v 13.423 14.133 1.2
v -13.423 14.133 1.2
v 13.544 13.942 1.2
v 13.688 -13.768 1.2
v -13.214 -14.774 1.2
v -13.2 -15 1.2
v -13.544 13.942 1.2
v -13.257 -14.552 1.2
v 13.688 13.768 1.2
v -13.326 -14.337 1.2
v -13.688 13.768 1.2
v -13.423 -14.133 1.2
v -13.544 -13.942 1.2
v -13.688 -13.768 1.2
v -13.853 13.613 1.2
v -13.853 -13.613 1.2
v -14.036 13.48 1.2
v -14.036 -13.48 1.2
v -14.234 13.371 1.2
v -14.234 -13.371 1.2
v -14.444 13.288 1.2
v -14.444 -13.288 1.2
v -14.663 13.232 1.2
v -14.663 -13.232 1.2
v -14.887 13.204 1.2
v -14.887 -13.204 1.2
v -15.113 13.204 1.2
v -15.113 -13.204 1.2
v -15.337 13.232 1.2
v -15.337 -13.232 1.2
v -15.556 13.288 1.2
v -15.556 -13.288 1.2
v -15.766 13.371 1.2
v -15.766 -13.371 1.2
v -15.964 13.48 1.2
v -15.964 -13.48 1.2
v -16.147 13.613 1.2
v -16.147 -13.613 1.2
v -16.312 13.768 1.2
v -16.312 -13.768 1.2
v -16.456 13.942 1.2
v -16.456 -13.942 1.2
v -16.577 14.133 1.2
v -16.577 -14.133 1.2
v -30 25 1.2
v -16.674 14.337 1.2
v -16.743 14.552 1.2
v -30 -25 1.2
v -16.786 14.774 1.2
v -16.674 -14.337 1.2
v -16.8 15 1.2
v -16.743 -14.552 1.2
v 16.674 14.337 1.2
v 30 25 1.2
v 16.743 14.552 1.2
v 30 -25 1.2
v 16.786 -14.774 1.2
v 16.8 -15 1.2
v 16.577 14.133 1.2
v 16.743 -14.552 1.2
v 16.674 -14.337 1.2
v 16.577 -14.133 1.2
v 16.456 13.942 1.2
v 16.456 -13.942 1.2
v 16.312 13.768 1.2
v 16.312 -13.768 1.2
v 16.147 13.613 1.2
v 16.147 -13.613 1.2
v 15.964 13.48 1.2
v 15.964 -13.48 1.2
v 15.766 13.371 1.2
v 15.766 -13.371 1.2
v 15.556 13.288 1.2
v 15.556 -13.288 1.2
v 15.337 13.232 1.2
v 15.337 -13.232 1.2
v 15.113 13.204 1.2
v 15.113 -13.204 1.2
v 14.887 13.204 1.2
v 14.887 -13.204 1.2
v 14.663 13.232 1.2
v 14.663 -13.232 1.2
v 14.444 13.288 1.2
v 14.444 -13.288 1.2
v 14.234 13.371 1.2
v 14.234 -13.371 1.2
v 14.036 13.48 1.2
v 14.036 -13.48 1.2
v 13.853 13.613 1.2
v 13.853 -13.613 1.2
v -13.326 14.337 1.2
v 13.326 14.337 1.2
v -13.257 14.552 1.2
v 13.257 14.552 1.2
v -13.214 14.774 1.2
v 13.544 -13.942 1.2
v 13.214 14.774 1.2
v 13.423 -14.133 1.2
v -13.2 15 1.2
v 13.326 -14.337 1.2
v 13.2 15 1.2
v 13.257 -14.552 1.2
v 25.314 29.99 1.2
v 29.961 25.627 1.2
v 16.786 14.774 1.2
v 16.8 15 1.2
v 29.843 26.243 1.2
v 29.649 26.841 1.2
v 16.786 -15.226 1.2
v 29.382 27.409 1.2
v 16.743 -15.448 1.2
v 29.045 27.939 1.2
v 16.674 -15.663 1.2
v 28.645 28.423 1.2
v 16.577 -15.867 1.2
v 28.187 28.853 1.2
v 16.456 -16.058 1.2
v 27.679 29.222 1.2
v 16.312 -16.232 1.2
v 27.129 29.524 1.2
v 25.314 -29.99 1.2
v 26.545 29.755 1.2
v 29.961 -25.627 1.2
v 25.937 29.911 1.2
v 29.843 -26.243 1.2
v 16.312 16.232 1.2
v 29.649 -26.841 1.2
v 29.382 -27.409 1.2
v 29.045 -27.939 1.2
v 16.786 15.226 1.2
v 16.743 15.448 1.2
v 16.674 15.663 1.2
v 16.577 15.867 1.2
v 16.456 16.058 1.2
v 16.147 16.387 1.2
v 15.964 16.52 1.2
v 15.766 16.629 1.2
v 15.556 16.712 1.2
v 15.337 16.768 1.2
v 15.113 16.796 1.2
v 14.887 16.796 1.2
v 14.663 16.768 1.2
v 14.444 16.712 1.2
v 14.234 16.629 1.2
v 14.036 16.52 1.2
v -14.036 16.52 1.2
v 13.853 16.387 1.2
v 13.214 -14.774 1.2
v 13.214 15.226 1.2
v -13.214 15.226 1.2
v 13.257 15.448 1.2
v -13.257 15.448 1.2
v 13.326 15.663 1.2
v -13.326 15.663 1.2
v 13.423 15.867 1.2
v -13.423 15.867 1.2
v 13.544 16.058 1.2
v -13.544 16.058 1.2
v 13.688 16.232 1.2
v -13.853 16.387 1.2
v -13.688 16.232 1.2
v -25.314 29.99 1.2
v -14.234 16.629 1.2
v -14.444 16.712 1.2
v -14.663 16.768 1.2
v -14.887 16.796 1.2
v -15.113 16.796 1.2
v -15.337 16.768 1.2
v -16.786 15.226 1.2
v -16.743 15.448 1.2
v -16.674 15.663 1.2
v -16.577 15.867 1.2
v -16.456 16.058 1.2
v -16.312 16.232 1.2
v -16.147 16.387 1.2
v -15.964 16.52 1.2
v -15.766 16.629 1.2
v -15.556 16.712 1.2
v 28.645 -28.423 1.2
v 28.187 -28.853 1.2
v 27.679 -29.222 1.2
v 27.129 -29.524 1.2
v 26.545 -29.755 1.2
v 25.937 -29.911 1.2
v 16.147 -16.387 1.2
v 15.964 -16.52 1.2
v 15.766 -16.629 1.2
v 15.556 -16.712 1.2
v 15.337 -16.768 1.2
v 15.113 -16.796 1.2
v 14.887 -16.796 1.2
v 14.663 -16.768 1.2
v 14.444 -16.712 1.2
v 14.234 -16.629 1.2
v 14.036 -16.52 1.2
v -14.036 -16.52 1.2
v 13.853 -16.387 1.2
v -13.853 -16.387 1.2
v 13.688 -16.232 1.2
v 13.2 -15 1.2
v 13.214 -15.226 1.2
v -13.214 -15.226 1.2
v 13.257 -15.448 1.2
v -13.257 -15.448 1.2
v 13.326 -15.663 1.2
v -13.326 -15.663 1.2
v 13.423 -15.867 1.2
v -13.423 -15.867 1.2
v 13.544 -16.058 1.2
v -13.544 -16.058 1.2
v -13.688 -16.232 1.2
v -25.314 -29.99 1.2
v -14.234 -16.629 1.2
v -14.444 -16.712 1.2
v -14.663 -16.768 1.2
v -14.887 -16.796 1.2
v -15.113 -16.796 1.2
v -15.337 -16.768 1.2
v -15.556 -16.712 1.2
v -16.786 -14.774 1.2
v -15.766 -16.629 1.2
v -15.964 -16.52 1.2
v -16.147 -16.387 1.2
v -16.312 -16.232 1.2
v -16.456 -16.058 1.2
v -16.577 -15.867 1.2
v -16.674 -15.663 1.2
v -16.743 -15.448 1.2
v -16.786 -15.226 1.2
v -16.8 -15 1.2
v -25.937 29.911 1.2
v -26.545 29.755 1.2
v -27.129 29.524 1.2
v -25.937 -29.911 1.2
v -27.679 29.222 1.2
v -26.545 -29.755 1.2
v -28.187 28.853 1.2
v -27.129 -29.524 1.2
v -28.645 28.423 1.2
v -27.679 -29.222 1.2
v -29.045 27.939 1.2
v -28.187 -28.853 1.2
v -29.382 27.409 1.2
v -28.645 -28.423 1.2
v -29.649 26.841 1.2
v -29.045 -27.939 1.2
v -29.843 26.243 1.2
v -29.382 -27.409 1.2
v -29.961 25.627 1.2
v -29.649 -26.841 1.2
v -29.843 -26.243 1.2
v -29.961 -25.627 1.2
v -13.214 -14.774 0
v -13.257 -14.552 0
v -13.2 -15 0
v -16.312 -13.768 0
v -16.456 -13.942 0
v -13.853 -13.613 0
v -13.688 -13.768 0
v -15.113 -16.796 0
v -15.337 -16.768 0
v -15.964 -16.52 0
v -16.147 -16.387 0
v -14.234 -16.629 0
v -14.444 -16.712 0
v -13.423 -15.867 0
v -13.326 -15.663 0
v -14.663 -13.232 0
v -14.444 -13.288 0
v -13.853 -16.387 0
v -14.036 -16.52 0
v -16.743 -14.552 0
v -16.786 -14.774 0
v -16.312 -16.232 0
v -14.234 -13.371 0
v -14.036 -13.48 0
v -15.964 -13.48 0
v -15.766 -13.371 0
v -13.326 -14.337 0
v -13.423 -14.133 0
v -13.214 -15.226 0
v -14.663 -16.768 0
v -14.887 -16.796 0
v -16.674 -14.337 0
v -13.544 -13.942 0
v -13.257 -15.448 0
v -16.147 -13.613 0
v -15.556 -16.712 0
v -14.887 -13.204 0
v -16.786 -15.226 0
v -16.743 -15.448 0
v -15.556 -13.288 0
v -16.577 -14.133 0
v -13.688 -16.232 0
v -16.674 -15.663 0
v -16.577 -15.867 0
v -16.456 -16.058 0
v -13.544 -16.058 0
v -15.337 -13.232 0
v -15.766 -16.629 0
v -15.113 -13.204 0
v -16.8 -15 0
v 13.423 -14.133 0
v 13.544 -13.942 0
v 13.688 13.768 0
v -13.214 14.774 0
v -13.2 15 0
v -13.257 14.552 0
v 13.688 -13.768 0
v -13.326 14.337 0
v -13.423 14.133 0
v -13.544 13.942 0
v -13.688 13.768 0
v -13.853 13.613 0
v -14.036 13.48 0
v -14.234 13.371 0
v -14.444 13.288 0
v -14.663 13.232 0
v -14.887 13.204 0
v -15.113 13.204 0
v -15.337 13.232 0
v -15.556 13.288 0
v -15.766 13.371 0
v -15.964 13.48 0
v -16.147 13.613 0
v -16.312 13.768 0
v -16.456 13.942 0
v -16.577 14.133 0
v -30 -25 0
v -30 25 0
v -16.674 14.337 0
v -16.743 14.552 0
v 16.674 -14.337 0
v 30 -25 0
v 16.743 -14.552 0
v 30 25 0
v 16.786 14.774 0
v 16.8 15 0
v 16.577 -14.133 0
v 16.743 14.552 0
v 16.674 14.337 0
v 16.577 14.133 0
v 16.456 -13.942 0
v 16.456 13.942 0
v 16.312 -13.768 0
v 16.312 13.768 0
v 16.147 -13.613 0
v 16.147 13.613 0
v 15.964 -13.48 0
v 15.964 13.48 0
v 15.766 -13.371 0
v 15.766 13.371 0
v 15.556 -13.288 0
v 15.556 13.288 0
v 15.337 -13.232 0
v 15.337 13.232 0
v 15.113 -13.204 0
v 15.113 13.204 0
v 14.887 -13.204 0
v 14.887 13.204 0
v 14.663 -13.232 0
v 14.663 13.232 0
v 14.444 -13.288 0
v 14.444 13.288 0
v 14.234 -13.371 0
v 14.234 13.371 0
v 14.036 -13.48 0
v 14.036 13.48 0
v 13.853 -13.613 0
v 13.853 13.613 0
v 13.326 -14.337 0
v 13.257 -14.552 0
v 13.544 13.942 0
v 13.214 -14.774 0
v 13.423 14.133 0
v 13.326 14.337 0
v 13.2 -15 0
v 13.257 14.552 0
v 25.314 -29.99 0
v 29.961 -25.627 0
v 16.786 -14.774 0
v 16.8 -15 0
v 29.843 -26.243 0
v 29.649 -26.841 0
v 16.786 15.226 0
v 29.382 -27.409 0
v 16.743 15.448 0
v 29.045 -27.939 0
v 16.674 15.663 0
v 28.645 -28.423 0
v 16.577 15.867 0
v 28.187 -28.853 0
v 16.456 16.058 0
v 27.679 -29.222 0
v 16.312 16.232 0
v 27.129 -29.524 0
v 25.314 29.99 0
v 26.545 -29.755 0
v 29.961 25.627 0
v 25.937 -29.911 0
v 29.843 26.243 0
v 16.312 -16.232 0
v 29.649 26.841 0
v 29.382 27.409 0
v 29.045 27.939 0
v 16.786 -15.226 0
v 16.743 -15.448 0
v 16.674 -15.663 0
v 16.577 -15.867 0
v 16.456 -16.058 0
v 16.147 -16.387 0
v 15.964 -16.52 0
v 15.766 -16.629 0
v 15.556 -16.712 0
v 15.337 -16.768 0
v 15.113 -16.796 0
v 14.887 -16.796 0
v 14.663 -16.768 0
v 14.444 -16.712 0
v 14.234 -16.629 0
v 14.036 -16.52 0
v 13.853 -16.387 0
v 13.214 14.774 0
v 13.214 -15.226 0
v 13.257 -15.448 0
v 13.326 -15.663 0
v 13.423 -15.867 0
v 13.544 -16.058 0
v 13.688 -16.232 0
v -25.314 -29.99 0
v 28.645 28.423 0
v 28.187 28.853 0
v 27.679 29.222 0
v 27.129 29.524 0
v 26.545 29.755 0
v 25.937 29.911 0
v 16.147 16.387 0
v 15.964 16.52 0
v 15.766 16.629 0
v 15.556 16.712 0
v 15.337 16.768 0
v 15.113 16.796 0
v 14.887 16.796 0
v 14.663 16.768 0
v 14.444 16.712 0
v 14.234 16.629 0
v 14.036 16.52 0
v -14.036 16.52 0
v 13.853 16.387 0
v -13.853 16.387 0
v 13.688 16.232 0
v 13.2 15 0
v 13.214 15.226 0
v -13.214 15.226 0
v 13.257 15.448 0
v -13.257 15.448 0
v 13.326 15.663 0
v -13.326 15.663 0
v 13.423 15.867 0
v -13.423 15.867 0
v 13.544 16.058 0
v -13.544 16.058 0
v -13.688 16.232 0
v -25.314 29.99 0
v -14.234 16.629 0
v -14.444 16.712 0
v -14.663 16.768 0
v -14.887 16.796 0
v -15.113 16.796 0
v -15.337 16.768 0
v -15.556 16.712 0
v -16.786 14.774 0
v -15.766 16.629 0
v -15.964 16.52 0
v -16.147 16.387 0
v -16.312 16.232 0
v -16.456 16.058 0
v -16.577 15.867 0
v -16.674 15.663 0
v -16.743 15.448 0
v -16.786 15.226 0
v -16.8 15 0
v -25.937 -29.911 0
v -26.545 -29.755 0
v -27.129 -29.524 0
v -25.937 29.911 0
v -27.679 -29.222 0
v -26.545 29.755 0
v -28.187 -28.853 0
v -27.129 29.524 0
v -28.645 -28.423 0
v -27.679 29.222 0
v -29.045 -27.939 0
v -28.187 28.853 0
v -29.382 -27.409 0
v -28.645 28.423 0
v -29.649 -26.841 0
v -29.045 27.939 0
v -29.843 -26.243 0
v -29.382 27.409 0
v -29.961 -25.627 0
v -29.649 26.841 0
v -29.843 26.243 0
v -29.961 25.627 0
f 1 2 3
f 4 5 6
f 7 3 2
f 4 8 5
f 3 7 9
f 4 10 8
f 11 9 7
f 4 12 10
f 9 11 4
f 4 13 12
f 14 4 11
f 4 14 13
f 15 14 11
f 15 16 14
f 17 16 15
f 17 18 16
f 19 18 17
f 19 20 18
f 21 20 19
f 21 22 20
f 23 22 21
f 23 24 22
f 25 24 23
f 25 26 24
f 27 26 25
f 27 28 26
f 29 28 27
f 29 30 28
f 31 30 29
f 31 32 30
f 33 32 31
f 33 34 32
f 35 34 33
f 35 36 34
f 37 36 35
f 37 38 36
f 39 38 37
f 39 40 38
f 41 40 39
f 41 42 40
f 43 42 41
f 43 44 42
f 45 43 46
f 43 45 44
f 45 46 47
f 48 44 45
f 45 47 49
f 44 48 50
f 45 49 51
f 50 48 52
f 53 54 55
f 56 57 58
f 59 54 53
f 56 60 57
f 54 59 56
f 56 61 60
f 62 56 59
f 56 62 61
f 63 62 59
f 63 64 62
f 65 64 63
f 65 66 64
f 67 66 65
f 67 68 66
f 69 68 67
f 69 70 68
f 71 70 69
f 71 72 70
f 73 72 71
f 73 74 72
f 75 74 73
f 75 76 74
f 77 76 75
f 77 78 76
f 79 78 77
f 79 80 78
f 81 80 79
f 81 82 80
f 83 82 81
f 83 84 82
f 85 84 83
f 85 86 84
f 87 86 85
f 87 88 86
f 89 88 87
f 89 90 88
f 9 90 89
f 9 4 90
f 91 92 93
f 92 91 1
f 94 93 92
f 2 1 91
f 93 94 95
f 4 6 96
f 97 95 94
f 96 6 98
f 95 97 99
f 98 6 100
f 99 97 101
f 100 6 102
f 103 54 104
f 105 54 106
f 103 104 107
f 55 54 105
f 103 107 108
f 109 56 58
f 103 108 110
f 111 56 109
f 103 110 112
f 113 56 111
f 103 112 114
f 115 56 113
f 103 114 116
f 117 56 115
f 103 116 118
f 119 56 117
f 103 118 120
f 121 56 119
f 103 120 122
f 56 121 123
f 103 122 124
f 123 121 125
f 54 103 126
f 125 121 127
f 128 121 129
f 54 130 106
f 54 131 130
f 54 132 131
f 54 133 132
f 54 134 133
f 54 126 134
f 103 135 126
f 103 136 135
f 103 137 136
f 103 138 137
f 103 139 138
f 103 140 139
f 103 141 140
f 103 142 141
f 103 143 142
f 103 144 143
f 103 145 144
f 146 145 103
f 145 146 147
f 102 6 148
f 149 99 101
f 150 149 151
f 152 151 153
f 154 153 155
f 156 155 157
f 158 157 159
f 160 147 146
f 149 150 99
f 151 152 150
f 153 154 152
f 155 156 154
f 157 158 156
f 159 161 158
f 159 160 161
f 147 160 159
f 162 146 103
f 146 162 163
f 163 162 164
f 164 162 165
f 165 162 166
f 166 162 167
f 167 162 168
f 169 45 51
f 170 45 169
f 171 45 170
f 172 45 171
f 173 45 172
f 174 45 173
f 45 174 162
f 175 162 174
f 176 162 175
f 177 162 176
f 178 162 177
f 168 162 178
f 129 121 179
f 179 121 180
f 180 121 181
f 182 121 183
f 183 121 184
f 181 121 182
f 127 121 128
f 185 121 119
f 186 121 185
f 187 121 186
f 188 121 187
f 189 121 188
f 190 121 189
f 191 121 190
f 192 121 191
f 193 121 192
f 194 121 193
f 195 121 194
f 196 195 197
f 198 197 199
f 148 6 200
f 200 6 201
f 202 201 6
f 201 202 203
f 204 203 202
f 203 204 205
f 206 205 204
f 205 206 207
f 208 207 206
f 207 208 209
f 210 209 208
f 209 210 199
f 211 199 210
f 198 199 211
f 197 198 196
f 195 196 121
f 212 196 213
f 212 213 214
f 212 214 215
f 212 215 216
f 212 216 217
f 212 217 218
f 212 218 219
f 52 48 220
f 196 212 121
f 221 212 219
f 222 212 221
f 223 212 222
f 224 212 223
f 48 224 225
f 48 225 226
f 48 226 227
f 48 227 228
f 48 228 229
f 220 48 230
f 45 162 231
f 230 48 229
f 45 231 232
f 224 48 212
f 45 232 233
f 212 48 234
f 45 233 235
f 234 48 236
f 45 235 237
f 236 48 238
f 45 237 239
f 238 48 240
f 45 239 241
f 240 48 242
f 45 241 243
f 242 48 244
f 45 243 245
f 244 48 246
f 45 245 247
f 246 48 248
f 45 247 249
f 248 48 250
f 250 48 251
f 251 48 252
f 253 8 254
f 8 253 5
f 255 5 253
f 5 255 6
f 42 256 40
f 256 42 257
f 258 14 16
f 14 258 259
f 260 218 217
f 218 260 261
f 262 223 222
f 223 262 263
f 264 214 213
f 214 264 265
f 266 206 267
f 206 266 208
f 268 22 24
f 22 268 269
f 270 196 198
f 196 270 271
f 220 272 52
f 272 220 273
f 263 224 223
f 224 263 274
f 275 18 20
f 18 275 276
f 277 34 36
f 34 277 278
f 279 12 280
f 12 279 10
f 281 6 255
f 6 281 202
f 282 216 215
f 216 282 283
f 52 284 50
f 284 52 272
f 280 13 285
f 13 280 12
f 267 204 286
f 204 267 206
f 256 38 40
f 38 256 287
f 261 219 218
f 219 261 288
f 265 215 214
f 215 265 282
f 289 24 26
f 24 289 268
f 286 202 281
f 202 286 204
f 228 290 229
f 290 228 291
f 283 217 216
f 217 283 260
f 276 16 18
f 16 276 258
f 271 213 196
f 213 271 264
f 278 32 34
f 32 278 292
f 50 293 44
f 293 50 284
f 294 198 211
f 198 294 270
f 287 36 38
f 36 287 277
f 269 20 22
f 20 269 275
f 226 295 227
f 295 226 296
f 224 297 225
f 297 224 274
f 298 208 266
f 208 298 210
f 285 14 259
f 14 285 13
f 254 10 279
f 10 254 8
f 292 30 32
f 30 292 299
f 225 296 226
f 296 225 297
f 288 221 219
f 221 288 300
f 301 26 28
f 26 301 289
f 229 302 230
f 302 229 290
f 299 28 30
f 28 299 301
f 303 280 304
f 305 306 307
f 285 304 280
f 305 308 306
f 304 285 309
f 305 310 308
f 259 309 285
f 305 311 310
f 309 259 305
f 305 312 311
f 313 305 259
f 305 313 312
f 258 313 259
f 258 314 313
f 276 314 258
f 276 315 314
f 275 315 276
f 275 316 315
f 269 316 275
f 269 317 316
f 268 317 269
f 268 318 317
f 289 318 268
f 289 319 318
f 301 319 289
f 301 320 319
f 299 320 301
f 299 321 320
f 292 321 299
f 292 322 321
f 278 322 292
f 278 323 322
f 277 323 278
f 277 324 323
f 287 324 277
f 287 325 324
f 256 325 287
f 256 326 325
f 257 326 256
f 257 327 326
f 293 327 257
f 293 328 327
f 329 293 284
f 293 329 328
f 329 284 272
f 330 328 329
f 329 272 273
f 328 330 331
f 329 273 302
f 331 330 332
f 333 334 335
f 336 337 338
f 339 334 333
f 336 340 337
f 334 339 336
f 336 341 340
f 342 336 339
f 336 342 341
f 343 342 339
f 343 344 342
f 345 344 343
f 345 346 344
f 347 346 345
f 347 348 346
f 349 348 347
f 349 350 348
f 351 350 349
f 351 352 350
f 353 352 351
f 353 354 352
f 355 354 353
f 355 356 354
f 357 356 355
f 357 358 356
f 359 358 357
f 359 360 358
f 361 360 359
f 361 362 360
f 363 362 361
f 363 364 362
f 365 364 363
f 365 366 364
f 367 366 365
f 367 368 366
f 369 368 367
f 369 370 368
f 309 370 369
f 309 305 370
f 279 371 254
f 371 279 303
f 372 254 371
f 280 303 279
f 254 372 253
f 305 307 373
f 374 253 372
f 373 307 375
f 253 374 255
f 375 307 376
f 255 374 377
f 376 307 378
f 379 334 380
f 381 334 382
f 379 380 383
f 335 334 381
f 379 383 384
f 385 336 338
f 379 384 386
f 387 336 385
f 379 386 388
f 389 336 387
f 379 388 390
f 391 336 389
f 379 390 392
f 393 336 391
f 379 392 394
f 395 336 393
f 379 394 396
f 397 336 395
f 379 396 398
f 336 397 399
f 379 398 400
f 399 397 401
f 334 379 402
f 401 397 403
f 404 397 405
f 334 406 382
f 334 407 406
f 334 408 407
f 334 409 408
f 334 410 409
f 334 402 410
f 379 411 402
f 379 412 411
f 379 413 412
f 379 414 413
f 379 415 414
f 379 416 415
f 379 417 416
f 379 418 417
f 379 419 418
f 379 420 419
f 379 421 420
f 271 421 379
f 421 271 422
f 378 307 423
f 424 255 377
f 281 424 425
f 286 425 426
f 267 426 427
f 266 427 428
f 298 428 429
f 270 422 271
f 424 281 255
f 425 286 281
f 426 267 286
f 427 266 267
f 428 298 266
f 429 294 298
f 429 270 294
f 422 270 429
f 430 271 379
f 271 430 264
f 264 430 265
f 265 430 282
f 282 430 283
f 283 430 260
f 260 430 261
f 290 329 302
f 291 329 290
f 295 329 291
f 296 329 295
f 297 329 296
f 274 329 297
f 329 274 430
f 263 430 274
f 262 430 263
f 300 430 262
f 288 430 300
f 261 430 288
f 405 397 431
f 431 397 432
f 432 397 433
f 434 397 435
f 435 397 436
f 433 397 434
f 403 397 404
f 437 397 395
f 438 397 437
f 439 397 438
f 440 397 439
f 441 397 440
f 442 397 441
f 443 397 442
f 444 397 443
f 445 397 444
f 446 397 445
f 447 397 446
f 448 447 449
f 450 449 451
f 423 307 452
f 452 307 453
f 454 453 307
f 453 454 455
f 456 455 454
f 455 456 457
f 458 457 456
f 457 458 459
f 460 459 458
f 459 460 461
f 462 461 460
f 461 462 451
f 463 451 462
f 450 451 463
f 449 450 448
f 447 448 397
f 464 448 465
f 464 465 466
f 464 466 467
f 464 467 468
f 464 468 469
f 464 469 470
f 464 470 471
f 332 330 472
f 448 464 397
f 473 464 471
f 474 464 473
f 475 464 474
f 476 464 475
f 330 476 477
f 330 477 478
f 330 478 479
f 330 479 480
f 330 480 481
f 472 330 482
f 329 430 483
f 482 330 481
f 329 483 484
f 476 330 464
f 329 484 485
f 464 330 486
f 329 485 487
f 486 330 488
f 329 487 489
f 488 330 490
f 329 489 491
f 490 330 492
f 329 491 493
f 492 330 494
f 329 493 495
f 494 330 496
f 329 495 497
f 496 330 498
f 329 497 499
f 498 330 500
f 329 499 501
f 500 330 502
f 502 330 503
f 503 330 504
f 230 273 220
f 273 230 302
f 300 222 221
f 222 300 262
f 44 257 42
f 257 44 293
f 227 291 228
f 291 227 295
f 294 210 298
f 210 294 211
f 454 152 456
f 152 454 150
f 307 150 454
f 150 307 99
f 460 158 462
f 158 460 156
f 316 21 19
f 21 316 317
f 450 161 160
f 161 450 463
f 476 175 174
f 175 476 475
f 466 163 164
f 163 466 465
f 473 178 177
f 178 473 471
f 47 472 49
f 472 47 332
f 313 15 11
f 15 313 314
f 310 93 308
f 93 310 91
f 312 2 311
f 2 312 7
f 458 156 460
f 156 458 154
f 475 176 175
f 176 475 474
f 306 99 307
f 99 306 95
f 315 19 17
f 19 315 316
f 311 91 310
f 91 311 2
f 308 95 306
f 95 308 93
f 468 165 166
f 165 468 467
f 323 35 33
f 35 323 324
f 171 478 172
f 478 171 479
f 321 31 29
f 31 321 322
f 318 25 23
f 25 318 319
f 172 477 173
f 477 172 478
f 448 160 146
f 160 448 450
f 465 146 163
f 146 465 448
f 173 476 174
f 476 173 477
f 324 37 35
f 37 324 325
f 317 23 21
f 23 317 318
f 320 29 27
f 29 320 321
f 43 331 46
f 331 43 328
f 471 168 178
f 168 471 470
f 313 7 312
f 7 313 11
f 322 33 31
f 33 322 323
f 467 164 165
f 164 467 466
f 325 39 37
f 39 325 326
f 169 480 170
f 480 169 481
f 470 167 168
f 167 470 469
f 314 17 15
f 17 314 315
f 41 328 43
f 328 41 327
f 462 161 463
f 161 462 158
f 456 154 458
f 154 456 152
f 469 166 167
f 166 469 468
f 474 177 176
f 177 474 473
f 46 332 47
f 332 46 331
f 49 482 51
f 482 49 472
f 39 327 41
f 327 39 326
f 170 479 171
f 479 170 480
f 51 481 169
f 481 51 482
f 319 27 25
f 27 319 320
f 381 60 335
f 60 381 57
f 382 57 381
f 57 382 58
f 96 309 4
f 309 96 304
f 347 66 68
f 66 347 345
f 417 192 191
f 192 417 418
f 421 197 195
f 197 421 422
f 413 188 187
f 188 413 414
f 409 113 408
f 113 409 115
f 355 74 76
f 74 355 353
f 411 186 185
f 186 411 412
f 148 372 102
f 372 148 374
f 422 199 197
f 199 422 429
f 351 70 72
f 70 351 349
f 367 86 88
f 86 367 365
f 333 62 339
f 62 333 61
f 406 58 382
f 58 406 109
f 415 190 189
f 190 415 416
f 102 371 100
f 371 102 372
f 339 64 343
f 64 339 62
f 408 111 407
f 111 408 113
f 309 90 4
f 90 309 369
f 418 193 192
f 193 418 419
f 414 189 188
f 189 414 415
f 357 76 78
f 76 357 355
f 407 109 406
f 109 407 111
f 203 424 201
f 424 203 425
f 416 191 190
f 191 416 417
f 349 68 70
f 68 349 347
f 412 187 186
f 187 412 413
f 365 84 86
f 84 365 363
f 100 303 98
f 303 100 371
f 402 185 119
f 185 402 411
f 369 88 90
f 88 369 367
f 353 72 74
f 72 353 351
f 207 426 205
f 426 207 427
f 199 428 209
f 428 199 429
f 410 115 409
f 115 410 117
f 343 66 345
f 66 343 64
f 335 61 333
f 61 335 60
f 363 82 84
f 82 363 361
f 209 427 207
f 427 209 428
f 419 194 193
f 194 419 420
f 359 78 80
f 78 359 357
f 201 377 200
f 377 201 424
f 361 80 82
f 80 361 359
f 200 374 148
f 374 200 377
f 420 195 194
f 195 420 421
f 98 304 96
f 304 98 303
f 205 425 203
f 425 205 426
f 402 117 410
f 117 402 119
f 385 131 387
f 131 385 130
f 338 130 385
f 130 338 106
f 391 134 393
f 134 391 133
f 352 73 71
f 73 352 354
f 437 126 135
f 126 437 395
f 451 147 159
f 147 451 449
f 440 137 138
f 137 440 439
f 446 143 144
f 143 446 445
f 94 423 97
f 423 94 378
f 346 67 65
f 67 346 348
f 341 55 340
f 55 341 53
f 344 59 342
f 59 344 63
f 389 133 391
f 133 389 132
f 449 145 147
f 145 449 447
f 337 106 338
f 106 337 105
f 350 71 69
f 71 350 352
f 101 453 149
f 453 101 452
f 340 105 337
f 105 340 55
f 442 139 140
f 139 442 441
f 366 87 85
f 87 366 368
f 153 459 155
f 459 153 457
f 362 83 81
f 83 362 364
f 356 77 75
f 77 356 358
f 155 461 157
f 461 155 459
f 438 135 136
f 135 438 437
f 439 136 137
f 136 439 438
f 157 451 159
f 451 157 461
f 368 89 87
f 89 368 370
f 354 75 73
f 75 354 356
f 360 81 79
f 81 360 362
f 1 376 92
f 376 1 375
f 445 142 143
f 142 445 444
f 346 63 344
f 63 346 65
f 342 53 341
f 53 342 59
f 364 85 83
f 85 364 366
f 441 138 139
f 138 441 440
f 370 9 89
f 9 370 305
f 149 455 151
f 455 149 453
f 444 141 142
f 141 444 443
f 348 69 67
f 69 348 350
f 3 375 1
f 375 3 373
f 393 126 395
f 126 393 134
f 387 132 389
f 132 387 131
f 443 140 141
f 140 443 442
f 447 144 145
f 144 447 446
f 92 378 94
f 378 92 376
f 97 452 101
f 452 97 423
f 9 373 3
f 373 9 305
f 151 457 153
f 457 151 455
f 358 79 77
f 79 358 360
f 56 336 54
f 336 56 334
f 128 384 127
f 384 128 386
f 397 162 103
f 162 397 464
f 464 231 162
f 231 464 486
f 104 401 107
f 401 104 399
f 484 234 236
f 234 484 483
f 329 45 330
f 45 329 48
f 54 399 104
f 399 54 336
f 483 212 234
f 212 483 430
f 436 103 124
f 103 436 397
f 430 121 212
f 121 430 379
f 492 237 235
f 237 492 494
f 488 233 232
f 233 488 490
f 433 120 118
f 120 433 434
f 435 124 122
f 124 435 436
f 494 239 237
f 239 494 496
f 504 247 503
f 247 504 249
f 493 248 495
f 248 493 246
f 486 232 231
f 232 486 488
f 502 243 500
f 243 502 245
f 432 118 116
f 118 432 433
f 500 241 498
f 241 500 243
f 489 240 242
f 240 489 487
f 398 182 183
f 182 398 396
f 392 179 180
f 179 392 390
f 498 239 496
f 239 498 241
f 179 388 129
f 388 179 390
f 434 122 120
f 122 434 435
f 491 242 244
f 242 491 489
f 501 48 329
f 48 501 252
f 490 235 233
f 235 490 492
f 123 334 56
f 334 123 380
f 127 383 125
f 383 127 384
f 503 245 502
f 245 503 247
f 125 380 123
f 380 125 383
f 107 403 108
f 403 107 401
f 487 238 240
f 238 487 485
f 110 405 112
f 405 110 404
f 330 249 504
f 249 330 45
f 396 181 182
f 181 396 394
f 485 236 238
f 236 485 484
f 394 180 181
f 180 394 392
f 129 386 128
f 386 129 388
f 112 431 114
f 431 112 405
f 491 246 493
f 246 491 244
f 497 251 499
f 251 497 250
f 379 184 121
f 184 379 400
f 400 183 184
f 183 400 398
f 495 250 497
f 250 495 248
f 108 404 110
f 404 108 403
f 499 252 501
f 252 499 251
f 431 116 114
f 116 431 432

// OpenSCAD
$fn = 50;


difference() {
	union() {
		hull() {
			translate(v = [-25.0000000000, 25.0000000000, 0]) {
				cylinder(h = 90, r = 5);
			}
			translate(v = [25.0000000000, 25.0000000000, 0]) {
				cylinder(h = 90, r = 5);
			}
			translate(v = [-25.0000000000, -25.0000000000, 0]) {
				cylinder(h = 90, r = 5);
			}
			translate(v = [25.0000000000, -25.0000000000, 0]) {
				cylinder(h = 90, r = 5);
			}
		}
	}
	union() {
		translate(v = [0, 0, 1.2000000000]) {
			hull() {
				translate(v = [-25.0000000000, 25.0000000000, 0]) {
					cylinder(h = 88.8000000000, r = 3.8000000000);
				}
				translate(v = [25.0000000000, 25.0000000000, 0]) {
					cylinder(h = 88.8000000000, r = 3.8000000000);
				}
				translate(v = [-25.0000000000, -25.0000000000, 0]) {
					cylinder(h = 88.8000000000, r = 3.8000000000);
				}
				translate(v = [25.0000000000, -25.0000000000, 0]) {
					cylinder(h = 88.8000000000, r = 3.8000000000);
				}
			}
		}
		#translate(v = [-15.0000000000, -15.0000000000, 0]) {
			cylinder(h = 1.2000000000, r = 1.8000000000);
		}
		#translate(v = [-15.0000000000, 15.0000000000, 0]) {
			cylinder(h = 1.2000000000, r = 1.8000000000);
		}
		#translate(v = [15.0000000000, -15.0000000000, 0]) {
			cylinder(h = 1.2000000000, r = 1.8000000000);
		}
		#translate(v = [15.0000000000, 15.0000000000, 0]) {
			cylinder(h = 1.2000000000, r = 1.8000000000);
		}
		translate(v = [-250.0000000000, -250.0000000000, 1.2000000000]) {
			cube(size = [500, 500, 500]);
		}
		translate(v = [-250.0000000000, -250.0000000000, 1.2000000000]) {
			cube(size = [500, 500, 500]);
		}
		translate(v = [-250.0000000000, -250.0000000000, 1.2000000000]) {
			cube(size = [500, 500, 500]);
		}
	}
}
